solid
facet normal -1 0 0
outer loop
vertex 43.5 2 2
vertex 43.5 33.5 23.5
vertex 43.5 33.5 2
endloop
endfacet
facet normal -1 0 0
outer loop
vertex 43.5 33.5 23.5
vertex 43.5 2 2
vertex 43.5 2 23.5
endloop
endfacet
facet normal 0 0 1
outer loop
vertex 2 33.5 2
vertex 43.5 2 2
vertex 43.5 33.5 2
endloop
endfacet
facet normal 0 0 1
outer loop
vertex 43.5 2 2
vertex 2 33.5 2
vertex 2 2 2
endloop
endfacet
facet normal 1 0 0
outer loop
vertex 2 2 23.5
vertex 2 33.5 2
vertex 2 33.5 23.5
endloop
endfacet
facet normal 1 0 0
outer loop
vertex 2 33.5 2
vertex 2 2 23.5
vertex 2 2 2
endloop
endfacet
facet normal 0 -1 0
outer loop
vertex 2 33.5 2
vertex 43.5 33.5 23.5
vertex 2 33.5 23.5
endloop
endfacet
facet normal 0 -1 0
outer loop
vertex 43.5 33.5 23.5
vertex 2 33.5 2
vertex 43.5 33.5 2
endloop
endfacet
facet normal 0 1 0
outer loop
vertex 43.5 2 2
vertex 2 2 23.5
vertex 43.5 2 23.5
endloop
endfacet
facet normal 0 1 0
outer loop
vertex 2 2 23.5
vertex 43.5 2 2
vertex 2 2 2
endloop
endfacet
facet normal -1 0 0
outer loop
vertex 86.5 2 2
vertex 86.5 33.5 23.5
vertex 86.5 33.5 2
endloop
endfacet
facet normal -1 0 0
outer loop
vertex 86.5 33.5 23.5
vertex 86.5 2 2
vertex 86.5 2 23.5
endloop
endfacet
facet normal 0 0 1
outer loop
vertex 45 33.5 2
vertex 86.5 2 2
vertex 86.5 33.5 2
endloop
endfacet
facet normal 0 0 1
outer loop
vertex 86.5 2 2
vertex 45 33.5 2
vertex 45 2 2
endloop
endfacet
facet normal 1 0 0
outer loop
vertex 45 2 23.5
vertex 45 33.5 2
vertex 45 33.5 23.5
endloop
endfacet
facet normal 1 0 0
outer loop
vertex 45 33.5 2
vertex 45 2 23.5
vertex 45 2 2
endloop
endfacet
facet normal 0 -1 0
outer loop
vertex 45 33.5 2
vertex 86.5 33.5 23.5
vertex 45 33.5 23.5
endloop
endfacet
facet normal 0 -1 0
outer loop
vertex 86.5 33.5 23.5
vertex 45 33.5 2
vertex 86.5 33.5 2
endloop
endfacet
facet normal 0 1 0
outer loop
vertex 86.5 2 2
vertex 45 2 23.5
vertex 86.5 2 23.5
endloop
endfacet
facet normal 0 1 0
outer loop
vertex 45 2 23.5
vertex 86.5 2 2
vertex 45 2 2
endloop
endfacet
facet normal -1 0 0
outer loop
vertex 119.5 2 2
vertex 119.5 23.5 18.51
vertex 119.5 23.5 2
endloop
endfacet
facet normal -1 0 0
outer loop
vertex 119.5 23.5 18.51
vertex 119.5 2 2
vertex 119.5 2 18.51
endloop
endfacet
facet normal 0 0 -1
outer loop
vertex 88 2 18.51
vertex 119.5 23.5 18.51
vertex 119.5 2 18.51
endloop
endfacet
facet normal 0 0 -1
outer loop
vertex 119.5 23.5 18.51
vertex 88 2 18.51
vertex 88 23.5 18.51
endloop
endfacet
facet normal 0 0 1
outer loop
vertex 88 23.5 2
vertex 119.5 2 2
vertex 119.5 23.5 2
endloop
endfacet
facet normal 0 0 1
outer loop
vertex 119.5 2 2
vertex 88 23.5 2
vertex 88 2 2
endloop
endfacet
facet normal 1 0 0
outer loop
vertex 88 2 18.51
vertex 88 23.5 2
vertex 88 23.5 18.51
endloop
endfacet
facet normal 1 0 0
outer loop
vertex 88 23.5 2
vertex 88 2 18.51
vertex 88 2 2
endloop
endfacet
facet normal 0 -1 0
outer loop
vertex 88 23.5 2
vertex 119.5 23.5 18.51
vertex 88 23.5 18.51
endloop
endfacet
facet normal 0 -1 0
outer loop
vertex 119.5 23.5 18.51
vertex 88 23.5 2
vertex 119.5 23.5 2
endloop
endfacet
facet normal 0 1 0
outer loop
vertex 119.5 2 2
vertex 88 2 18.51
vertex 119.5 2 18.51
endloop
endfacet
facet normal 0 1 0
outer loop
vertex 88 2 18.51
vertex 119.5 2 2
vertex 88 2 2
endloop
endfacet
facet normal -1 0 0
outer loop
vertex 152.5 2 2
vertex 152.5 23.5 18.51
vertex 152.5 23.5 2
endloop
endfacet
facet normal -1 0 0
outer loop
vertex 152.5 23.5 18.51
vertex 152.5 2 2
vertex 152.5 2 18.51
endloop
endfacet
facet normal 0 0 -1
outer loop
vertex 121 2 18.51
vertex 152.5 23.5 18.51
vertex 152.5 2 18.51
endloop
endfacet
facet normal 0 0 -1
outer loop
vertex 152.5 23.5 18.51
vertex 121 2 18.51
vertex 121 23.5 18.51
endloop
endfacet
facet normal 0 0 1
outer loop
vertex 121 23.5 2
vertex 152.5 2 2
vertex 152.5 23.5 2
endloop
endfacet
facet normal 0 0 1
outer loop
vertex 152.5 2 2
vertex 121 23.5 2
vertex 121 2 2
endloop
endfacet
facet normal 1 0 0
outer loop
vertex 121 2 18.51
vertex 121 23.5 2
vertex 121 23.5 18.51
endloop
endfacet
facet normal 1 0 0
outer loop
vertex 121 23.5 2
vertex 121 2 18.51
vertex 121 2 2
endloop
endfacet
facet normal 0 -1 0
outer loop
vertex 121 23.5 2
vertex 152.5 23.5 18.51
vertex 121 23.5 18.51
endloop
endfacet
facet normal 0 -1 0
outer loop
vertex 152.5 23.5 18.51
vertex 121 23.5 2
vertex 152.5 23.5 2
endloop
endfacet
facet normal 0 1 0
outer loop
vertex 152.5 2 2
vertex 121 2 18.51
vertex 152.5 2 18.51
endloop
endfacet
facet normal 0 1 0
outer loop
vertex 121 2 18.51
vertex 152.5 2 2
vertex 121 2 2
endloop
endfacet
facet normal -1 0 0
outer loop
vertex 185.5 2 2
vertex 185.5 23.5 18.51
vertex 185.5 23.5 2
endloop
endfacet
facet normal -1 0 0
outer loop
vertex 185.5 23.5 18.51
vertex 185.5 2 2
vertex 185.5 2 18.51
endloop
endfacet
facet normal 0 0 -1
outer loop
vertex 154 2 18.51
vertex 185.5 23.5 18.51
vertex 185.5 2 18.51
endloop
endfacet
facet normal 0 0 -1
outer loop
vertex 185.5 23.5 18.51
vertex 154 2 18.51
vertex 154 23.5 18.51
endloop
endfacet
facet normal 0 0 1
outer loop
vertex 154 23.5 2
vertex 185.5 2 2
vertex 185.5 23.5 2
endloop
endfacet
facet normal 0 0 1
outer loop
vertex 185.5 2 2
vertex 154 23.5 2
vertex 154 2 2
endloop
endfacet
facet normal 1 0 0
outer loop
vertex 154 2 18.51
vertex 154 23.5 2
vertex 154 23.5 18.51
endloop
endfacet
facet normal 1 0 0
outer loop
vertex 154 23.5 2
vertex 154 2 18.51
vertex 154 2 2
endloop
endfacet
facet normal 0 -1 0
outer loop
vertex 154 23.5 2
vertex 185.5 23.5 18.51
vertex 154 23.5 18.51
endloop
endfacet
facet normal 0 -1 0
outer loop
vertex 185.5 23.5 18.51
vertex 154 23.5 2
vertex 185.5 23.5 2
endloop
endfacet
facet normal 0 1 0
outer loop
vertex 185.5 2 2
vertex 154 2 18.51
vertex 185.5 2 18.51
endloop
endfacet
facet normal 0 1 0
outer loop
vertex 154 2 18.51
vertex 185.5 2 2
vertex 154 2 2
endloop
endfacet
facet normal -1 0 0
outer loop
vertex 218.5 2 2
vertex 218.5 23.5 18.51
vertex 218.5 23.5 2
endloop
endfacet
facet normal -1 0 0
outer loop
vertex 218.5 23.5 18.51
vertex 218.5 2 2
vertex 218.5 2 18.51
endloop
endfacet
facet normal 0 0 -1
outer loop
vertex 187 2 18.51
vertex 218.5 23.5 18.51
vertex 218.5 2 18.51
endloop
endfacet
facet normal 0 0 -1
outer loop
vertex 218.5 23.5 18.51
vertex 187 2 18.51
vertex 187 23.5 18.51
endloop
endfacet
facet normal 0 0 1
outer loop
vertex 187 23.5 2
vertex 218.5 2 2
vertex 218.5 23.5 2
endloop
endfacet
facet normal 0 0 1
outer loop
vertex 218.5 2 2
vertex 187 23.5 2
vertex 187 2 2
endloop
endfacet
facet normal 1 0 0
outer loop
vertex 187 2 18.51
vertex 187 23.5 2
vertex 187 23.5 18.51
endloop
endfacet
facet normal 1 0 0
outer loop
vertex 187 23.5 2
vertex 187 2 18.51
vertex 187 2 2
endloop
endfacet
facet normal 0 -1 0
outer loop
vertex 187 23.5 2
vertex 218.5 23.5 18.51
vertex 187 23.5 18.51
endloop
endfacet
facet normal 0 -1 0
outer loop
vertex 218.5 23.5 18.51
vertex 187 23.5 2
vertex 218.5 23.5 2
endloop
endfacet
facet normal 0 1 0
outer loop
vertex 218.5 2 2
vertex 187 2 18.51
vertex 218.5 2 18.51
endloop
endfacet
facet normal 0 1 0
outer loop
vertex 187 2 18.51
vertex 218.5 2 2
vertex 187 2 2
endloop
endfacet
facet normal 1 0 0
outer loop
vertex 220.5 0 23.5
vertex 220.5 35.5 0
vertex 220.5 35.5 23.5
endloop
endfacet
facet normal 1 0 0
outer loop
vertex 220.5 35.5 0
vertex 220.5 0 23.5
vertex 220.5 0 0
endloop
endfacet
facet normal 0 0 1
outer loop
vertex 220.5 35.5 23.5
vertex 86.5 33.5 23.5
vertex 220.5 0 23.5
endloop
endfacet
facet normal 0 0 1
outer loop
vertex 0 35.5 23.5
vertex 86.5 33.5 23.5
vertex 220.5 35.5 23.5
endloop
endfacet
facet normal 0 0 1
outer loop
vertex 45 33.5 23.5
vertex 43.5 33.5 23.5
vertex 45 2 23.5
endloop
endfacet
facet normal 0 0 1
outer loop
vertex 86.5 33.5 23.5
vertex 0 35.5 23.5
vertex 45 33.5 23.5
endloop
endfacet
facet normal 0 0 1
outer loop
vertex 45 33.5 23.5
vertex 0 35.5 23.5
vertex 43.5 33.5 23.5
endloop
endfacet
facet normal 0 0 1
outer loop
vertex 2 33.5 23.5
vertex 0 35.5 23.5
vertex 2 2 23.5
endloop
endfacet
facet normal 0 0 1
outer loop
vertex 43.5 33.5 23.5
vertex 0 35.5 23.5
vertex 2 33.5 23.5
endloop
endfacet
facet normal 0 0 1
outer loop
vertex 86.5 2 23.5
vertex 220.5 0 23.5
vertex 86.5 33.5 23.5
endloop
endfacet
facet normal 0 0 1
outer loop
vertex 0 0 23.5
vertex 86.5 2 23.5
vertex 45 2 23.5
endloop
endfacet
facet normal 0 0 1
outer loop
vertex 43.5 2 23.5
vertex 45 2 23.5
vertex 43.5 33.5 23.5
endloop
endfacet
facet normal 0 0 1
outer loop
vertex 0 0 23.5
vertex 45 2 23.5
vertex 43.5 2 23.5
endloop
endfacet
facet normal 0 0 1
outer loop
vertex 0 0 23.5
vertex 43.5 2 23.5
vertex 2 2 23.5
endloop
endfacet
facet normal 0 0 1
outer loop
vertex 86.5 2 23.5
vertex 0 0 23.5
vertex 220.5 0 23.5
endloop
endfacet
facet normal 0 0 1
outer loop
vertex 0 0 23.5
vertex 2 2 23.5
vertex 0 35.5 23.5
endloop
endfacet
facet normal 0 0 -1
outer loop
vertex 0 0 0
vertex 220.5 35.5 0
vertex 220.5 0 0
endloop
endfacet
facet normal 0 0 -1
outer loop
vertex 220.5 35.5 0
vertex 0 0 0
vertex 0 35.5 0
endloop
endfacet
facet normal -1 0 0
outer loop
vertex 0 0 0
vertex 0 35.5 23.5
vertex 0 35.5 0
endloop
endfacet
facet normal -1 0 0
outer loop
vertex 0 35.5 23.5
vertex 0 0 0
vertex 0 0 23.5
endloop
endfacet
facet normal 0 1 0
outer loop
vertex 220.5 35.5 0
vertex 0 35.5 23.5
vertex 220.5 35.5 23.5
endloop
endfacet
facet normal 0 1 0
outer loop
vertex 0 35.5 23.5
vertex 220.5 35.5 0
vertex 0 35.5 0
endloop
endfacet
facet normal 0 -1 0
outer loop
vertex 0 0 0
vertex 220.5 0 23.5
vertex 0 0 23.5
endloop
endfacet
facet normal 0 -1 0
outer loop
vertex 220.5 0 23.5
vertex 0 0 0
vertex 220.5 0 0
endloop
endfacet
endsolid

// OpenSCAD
// Generated by SolidPython 1.1.3 on 2026-02-21 17:48:05


difference() {
	cube(size = [220.5000000000, 35.5000000000, 23.5000000000]);
	union() {
		translate(v = [2.0000000000, 2.0000000000, 2.0000000000]) {
			cube(size = [41.5000000000, 31.5000000000, 21.5100000000]);
		}
		translate(v = [45.0000000000, 2.0000000000, 2.0000000000]) {
			cube(size = [41.5000000000, 31.5000000000, 21.5100000000]);
		}
		translate(v = [88.0000000000, 2.0000000000, 2.0000000000]) {
			cube(size = [31.5000000000, 21.5000000000, 16.5100000000]);
		}
		translate(v = [121.0000000000, 2.0000000000, 2.0000000000]) {
			cube(size = [31.5000000000, 21.5000000000, 16.5100000000]);
		}
		translate(v = [154.0000000000, 2.0000000000, 2.0000000000]) {
			cube(size = [31.5000000000, 21.5000000000, 16.5100000000]);
		}
		translate(v = [187.0000000000, 2.0000000000, 2.0000000000]) {
			cube(size = [31.5000000000, 21.5000000000, 16.5100000000]);
		}
	}
}
/***********************************************
*********      SolidPython code:      **********
************************************************
 
"""SolidPython geometry building for storage cases."""

from typing import List, Union

from solid import cube, difference, scad_render_to_file, translate, union

from .config import Config
from .layout import GridLayoutResult, MixedLayoutResult, SlotRect


def build_base_tray(
    slots: List[SlotRect],
    total_width: float,
    total_length: float,
    config: Config,
):
    """Build the solid base tray (floor + perimeter walls) with slot cavities subtracted."""
    wall = config.wall_thickness
    base_h = config.base_height
    max_height = max(s.height for s in slots)

    outer_x = total_width + 2 * wall
    outer_y = total_length + 2 * wall
    outer_z = base_h + max_height

    outer_box = cube([outer_x, outer_y, outer_z])

    # Subtract each slot cavity
    cavities = []
    for slot in slots:
        cavity = translate([wall + slot.x, wall + slot.y, base_h])(
            cube([slot.width, slot.length, slot.height + 0.01])  # +epsilon for clean cut
        )
        cavities.append(cavity)

    if cavities:
        tray = difference()(outer_box, union()(*cavities))
    else:
        tray = outer_box

    return tray


def assemble_case(
    layout_result: Union[GridLayoutResult, MixedLayoutResult],
    config: Config,
):
    """Assemble the complete case: base tray with slot cavities (dividers are implicit)."""
    slots = layout_result.slots
    total_width = layout_result.total_width
    total_length = layout_result.total_length

    case = build_base_tray(slots, total_width, total_length, config)
    return case


def render_to_file(assembly, filepath: str) -> None:
    """Render the assembly to an OpenSCAD .scad file."""
    scad_render_to_file(assembly, filepath)
 
 
************************************************/
